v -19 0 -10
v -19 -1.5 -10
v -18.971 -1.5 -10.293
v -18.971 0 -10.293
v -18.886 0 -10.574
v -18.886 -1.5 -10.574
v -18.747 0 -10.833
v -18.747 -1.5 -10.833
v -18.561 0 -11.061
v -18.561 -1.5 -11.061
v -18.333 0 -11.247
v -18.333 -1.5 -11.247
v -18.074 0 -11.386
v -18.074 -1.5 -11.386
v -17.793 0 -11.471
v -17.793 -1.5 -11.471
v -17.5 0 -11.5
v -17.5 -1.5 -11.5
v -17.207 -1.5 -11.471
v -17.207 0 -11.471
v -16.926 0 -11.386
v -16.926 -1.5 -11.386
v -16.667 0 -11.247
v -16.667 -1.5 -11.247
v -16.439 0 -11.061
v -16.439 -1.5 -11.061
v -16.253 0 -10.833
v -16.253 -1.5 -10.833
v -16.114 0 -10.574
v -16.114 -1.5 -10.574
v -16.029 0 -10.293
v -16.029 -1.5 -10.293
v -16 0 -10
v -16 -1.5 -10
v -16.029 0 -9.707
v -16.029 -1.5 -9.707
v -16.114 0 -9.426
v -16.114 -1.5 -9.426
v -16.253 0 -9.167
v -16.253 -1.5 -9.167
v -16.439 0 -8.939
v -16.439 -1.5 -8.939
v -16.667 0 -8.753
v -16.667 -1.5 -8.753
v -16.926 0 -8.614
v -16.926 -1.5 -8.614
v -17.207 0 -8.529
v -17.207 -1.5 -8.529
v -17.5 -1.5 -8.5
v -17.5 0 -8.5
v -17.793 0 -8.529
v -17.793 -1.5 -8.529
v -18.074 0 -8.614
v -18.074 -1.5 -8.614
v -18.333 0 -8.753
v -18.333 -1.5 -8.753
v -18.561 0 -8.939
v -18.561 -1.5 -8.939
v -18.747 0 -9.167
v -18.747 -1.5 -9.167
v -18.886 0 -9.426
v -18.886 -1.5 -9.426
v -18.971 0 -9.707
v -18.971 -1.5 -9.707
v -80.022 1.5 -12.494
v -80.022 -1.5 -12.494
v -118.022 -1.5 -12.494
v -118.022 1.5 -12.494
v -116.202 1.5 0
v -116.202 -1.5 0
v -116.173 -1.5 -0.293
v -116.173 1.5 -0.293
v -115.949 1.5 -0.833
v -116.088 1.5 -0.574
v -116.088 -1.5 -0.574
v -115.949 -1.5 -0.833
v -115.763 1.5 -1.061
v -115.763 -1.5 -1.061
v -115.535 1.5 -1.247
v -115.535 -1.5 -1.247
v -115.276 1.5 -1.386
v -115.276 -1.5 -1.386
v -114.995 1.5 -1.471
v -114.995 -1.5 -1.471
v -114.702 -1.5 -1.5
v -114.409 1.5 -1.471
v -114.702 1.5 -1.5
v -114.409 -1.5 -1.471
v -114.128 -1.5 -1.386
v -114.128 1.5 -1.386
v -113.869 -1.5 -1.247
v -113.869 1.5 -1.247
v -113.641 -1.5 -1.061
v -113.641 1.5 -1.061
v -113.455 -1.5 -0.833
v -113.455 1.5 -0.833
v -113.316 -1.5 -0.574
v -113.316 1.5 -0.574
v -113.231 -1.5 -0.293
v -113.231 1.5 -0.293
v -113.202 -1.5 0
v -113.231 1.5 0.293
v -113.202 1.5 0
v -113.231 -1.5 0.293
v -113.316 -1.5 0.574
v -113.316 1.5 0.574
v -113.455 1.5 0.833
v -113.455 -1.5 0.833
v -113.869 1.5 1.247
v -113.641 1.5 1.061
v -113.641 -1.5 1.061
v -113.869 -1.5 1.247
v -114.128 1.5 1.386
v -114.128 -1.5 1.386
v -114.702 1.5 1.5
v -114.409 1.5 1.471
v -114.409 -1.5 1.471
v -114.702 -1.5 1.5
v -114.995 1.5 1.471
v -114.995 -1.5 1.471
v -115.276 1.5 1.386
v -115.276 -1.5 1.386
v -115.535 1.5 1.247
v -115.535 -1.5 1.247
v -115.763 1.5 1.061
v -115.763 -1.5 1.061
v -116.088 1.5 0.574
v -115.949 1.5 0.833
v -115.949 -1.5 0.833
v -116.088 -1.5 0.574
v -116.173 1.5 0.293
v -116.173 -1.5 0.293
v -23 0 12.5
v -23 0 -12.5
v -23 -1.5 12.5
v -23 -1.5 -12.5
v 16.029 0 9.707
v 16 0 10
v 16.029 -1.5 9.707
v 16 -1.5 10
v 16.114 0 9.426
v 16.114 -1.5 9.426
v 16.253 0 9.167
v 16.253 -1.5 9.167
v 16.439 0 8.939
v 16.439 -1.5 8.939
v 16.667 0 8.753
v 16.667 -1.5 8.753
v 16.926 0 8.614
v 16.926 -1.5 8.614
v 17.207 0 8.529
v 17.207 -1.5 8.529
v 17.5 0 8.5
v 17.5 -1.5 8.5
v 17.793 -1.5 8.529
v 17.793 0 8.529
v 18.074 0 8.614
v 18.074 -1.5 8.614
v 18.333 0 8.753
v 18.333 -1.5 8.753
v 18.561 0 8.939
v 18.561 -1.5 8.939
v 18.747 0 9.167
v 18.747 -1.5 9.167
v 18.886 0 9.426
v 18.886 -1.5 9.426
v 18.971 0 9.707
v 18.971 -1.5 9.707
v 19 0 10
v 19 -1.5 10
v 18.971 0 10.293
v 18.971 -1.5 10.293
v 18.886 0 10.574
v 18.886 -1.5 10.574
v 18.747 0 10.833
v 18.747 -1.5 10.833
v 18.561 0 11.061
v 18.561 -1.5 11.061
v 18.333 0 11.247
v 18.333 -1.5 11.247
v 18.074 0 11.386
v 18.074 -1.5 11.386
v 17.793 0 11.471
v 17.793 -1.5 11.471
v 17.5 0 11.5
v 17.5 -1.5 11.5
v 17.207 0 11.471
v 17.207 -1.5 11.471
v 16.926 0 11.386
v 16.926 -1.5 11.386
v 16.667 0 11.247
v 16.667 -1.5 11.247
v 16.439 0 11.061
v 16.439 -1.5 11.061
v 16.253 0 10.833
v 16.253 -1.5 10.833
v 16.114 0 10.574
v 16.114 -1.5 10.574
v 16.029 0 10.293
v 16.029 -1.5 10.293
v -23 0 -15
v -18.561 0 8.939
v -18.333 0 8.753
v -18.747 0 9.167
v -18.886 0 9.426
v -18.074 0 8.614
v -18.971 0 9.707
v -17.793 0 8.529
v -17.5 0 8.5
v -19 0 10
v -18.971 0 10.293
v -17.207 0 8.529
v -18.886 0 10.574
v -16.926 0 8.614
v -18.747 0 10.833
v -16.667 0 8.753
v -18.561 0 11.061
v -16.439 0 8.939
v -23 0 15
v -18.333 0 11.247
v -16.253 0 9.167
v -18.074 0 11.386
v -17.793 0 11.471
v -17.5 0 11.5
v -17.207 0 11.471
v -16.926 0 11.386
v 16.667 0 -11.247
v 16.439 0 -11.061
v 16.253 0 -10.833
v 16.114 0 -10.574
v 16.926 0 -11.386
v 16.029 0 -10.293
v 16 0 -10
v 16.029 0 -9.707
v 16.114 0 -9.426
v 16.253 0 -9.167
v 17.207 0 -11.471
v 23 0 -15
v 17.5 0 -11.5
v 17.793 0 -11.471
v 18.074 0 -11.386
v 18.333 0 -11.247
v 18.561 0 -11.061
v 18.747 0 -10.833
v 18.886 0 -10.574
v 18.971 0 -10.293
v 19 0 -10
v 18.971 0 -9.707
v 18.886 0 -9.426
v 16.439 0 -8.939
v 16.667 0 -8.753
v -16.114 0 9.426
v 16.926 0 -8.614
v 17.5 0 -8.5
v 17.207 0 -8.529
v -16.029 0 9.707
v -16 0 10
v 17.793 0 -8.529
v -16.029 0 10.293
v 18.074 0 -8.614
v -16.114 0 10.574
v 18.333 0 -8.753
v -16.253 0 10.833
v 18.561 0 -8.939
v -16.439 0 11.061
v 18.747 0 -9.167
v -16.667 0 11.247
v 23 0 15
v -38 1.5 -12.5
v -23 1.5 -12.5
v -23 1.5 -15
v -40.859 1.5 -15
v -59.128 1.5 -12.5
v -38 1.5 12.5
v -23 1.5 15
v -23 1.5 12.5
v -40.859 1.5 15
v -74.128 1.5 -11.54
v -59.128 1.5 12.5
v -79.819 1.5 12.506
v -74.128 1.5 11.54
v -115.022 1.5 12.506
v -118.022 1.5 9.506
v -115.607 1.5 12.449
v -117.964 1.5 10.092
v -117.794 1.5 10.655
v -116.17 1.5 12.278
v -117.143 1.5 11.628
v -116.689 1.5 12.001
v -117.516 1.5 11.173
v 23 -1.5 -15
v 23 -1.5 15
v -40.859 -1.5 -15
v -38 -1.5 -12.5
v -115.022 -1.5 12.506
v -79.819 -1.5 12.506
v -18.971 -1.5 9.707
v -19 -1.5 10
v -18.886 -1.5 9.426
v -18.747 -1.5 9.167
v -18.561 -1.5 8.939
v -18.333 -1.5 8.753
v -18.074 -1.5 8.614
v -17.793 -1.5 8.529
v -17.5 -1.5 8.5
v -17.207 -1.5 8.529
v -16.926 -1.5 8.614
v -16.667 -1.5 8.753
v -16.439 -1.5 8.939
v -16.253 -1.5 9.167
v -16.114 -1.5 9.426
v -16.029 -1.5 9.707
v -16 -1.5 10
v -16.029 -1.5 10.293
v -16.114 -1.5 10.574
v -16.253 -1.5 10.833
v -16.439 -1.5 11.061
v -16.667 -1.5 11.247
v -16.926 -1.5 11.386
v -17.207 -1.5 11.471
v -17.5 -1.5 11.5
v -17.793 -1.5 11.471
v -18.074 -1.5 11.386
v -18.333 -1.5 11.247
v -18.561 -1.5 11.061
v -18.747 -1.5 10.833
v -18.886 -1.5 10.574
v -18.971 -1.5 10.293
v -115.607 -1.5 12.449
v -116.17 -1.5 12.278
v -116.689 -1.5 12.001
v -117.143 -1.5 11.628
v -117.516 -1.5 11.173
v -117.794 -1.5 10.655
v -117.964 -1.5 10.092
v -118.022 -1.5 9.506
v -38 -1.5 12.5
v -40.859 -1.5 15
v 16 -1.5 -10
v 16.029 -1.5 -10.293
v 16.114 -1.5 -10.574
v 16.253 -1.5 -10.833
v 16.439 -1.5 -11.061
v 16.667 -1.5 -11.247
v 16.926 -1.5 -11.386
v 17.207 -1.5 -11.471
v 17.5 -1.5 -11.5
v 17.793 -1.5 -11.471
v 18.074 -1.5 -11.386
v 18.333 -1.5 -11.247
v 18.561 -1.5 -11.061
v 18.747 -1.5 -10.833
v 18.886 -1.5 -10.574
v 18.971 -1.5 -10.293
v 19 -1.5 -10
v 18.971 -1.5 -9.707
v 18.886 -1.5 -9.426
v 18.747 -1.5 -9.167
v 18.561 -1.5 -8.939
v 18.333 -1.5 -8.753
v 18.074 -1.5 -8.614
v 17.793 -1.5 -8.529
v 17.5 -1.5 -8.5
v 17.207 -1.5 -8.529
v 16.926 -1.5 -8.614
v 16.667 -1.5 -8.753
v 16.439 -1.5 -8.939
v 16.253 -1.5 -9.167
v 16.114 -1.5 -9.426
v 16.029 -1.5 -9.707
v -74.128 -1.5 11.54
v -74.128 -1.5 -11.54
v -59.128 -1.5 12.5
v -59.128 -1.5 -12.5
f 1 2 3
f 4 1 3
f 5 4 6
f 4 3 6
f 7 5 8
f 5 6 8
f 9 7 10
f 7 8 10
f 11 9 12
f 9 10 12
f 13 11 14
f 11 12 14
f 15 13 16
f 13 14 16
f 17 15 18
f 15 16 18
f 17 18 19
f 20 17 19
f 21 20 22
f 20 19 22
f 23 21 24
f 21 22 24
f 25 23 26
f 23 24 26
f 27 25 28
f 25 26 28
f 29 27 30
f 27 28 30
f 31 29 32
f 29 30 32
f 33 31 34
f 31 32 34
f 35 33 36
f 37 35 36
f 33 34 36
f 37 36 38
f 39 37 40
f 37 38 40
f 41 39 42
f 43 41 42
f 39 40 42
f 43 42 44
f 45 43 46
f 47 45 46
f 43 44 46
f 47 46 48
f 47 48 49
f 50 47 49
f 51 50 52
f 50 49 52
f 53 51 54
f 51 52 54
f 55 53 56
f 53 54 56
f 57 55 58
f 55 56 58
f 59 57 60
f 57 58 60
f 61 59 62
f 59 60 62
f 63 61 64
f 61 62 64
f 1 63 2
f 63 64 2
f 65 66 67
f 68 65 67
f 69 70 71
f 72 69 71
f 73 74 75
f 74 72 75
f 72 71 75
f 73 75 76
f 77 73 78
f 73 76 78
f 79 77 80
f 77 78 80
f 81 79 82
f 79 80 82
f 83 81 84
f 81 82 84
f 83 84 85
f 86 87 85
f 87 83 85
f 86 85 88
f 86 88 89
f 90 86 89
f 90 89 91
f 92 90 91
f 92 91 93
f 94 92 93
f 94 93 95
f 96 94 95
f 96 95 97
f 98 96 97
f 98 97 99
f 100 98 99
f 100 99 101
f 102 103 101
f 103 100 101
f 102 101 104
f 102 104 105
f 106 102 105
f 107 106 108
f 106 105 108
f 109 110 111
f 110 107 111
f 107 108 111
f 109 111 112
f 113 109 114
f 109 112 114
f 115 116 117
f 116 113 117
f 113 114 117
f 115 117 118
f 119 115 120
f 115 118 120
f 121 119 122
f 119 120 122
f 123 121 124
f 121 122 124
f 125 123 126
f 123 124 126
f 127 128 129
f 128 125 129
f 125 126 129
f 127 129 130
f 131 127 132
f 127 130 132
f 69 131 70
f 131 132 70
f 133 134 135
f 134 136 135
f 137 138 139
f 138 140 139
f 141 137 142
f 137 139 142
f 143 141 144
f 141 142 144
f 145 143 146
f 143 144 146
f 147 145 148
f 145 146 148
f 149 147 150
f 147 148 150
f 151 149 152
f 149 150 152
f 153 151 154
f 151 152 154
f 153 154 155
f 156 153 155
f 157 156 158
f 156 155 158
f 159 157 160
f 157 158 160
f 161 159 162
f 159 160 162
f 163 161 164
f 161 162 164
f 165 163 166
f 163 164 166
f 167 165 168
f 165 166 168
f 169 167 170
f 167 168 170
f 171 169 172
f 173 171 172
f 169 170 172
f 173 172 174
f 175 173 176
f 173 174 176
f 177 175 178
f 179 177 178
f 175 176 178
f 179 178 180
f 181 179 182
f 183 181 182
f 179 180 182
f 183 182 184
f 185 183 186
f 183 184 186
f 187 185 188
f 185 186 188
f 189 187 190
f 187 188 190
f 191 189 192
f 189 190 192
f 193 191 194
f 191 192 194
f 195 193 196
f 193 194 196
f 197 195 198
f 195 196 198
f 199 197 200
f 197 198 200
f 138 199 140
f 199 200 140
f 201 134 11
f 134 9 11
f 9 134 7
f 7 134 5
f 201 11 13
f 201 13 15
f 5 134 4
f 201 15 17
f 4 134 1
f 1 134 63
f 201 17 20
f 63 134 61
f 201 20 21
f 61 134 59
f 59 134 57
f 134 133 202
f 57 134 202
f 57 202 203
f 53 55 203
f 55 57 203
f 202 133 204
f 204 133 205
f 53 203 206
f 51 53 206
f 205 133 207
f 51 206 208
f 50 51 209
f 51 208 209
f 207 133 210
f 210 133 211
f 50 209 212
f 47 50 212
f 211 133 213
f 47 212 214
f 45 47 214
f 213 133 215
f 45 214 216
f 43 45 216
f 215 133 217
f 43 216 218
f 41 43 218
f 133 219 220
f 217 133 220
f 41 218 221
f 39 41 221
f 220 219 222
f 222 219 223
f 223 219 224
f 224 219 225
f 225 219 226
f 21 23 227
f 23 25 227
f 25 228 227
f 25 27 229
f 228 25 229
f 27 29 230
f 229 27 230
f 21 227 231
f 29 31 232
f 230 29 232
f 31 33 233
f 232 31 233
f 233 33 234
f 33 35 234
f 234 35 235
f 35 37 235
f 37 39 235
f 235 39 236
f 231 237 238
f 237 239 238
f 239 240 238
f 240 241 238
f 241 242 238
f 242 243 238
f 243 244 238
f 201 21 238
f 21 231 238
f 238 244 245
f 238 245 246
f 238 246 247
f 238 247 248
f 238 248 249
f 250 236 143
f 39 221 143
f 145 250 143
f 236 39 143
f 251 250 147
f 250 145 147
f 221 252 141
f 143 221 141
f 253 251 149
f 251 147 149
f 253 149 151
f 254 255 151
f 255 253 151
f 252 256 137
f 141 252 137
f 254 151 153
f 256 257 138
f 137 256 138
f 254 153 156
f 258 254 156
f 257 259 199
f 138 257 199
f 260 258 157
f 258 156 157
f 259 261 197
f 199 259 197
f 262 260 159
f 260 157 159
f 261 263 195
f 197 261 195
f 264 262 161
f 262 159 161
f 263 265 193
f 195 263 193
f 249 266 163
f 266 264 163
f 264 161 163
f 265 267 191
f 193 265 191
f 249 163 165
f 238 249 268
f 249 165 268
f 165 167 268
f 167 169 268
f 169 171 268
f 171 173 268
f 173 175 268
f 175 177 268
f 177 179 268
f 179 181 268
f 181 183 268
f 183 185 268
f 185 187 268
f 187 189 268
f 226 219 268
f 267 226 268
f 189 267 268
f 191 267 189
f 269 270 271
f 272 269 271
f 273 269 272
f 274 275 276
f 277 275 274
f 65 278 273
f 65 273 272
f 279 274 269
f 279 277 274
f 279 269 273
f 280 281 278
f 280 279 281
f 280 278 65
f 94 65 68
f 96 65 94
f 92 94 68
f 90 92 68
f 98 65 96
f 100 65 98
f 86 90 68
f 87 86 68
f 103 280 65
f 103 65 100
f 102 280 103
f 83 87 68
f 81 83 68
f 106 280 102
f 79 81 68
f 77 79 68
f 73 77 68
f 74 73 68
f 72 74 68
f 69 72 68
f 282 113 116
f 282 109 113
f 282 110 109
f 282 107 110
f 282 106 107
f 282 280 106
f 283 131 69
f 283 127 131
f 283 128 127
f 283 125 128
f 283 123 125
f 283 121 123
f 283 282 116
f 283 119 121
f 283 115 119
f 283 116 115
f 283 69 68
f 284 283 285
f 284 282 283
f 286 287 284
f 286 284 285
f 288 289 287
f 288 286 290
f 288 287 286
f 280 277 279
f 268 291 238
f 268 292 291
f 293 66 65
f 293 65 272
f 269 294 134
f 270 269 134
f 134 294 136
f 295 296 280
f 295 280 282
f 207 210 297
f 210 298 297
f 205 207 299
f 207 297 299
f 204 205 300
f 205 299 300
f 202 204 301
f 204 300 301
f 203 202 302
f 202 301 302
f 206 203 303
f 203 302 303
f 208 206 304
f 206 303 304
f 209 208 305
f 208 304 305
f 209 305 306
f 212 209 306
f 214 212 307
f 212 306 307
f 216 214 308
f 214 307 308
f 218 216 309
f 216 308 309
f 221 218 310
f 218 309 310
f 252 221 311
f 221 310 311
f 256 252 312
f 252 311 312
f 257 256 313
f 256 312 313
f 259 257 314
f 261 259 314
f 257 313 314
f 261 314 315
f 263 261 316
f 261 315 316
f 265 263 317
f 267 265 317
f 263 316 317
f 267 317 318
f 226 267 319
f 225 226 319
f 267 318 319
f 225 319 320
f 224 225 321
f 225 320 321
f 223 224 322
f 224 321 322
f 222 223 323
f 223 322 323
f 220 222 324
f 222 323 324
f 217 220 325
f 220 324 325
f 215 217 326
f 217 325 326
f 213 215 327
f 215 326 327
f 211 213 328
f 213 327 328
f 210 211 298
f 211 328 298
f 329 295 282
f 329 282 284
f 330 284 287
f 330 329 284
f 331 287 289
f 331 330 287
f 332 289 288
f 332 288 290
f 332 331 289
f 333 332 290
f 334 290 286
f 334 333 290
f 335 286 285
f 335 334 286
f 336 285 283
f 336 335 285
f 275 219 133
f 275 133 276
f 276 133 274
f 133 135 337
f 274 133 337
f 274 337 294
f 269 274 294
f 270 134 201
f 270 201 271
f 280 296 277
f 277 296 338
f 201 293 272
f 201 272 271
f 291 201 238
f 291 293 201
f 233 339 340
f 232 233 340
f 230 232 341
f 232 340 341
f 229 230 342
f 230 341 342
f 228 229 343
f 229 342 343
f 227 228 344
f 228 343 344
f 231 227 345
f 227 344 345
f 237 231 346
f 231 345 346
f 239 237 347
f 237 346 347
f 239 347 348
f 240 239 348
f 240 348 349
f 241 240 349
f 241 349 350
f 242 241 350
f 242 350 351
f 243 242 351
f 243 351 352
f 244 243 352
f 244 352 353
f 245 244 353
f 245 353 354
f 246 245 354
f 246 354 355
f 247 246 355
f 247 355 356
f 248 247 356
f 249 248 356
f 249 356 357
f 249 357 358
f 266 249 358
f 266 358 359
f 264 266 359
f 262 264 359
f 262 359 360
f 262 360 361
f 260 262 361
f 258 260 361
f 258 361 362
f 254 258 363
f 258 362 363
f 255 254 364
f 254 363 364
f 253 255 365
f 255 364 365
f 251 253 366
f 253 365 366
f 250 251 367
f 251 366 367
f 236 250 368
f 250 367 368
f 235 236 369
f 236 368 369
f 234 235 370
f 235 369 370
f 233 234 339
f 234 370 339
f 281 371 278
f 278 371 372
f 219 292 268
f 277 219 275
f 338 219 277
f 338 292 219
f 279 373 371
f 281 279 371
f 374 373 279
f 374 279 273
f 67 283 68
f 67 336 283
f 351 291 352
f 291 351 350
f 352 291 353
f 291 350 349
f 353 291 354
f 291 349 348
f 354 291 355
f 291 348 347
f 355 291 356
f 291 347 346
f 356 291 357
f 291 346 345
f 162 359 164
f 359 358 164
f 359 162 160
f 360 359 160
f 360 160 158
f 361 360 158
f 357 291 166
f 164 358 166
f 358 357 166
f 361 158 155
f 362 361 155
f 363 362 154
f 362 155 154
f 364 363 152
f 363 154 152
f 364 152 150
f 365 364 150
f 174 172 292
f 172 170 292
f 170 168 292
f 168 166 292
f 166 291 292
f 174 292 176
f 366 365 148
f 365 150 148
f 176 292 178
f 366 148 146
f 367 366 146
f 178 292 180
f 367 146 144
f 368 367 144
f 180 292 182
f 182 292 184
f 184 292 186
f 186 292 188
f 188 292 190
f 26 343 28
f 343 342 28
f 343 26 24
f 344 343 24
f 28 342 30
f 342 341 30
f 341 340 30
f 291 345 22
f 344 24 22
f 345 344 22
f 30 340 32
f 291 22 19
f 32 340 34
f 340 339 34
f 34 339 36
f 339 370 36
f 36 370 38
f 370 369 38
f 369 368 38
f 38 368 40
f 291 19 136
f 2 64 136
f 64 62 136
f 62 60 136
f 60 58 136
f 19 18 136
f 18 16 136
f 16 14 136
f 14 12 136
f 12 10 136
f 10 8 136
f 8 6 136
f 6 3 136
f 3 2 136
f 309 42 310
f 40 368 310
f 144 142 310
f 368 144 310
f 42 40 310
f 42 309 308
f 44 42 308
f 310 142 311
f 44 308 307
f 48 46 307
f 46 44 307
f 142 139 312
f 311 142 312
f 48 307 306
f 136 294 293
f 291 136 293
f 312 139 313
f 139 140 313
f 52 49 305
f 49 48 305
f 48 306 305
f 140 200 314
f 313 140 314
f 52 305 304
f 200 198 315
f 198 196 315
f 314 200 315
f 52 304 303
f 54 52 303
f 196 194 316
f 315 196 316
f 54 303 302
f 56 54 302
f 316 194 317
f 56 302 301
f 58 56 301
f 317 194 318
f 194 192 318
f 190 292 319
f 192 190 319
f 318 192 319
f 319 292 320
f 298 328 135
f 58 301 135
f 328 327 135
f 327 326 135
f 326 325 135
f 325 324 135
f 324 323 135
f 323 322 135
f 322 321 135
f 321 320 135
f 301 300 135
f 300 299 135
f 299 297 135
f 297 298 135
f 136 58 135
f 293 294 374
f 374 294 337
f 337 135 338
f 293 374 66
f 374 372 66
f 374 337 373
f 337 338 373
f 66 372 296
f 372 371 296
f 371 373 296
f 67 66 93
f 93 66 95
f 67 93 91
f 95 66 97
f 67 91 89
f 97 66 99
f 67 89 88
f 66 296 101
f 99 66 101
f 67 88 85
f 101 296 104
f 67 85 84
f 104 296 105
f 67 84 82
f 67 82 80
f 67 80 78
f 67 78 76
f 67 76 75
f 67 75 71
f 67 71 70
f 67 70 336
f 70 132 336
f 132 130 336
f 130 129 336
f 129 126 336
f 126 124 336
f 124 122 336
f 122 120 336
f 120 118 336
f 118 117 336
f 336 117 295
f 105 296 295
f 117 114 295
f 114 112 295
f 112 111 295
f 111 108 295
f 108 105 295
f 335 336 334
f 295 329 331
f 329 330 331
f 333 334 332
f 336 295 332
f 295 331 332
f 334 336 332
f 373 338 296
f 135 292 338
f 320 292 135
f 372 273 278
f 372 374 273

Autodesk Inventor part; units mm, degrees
ref_plane "YZ Plane" through (0, 0, 0) normal (1, 0, 0) x (0, 1, 0)
ref_plane "XZ Plane" through (0, 0, 0) normal (0, 1, 0) x (-1, 0, 0)
ref_plane "XY Plane" through (0, 0, 0) normal (0, 0, 1) x (1, 0, 0)
sketch "Sketch1" plane through (0, 0, 0) normal (0, 1, 0) x (-1, 0, 0)
  line L0 (-79.8192, 12.5065) -> (-40.859, 15)
  line L1 (-40.859, 15) -> (0, 15)
  line L2 (-80.022, 0) -> (80.022, 0) construction
  line L3 (-80.022, -12.4935) -> (-40.859, -15)
  line L4 (-40.859, -15) -> (0, -15)
  line L5 (0, 15) -> (0, -15) construction
  line L6 (40.859, 15) -> (0, 15)
  line L7 (79.8192, 12.5065) -> (40.859, 15)
  line L8 (80.022, -12.4935) -> (40.859, -15)
  line L9 (40.859, -15) -> (0, -15)
  line L10 (-59.1282, -12.5) -> (-74.1282, -11.54)
  line L11 (-59.1282, 12.5) -> (-74.1282, 11.54)
  line L12 (-74.1282, 11.54) -> (-74.1282, -11.54)
  line L13 (-59.1282, 12.5) -> (-59.1282, -12.5)
  line L14 (-23, 12.5) -> (-38, 12.5)
  line L15 (-38, 12.5) -> (-38, -12.5)
  line L16 (-38, -12.5) -> (-23, -12.5)
  line L17 (-23, -12.5) -> (-23, 12.5)
  line L18 (59.1282, -12.5) -> (74.1282, -11.54)
  line L19 (59.1282, 12.5) -> (74.1282, 11.54)
  line L20 (74.1282, 11.54) -> (74.1282, -11.54)
  line L21 (59.1282, 12.5) -> (59.1282, -12.5)
  line L22 (23, 12.5) -> (38, 12.5)
  line L23 (38, 12.5) -> (38, -12.5)
  line L24 (38, -12.5) -> (23, -12.5)
  line L25 (23, -12.5) -> (23, 12.5)
  circle A0 centre (-17.5, -10) radius 1.5
  circle A1 centre (17.5, -10) radius 1.5
  circle A2 centre (-17.5, 10) radius 1.5
  circle A3 centre (17.5, 10) radius 1.5
  line L26 (-79.8192, 12.5065) -> (-118.022, 12.5065)
  line L27 (-118.022, 12.5065) -> (-118.022, -12.4935)
  line L28 (-80.022, -12.4935) -> (-118.022, -12.4935)
  circle A4 centre (-114.702, 0) radius 1.5
  line L29 (79.8192, 12.5065) -> (118.022, 12.5065)
  line L30 (118.022, 12.5065) -> (118.022, -12.4935)
  line L31 (80.022, -12.4935) -> (118.022, -12.4935)
  circle A5 centre (114.702, 0) radius 1.5
  point P0 (0, 0)
  point P1 (0, 0)
  point P2 (0, 0)
  point P3 (-74.1282, 0)
  point P4 (-30.5, 12.5)
  dimension "d11" = 15
  dimension "d13" = 3
  dimension "d14" = 5
  dimension "d15" = 5.5
  dimension "d17" = 38
  dimension "d23" = 3
  dimension "d24" = 3.32
  dimension "d33" = 23
  dimension "d44" = 40.859
  dimension "d45" = 39.163
  dimension "d49" = 30
  dimension "d50" = 25
  dimension "d51" = 5.8938
  dimension "d52" = 15
  dimension "d53" = 25
  dimension "d54" = 1.328
extrude "Extrusion1" add sketch "Sketch1" along normal mid plane 3
fillet "Fillet1" radius 3 2 edges at (-118.022, 0, 12.5065) (118.022, 0, 12.5065)
sketch "Sketch3" plane through (-40.859, 1.5, 15) normal (0, 0, 1) x (1, 0, 0)
  line L0 (0, 0) -> (81.718, 0) projected
  line L1 (81.718, -3) -> (0, -3) projected
  line L2 (17.859, -3) -> (17.859, 0) projected
  line L3 (63.859, -3) -> (63.859, 0) projected
  line L4 (17.859, -3) -> (17.859, 0) projected
  line L5 (17.859, -1.5) -> (63.859, -1.5)
  line L6 (158.881, -3) -> (158.881, 0) projected
  line L7 (120.6782, 0) -> (155.881, 0) projected
  line L8 (155.881, 0) -> (158.881, 0) projected
  line L9 (158.881, -3) -> (155.881, -3) projected
  line L10 (155.881, -3) -> (120.6782, -3) projected
  line L11 (120.6782, -3) -> (81.718, -3) projected
  line L12 (81.718, 0) -> (120.6782, 0) projected
  line L13 (-38.9602, 0) -> (0, 0) projected
  line L14 (0, -3) -> (-38.9602, -3) projected
  line L15 (-74.163, 0) -> (-38.9602, 0) projected
  line L16 (-38.9602, -3) -> (-74.163, -3) projected
  line L17 (-77.163, 0) -> (-77.163, -3) projected
  line L18 (-74.163, -3) -> (-77.163, -3) projected
  line L19 (-77.163, 0) -> (-74.163, 0) projected
  point P0 (40.859, -1.5)
  point P1 (17.859, -1.5)
extrude "Extrusion3" cut sketch "Sketch3" against normal through all contours L0 L3 L5 L2 | L0 L12 L7 L8 L6 L9 L10 L11 L1 L3
properties part number "nakladka_boczna1" material "PCTG 20%"
